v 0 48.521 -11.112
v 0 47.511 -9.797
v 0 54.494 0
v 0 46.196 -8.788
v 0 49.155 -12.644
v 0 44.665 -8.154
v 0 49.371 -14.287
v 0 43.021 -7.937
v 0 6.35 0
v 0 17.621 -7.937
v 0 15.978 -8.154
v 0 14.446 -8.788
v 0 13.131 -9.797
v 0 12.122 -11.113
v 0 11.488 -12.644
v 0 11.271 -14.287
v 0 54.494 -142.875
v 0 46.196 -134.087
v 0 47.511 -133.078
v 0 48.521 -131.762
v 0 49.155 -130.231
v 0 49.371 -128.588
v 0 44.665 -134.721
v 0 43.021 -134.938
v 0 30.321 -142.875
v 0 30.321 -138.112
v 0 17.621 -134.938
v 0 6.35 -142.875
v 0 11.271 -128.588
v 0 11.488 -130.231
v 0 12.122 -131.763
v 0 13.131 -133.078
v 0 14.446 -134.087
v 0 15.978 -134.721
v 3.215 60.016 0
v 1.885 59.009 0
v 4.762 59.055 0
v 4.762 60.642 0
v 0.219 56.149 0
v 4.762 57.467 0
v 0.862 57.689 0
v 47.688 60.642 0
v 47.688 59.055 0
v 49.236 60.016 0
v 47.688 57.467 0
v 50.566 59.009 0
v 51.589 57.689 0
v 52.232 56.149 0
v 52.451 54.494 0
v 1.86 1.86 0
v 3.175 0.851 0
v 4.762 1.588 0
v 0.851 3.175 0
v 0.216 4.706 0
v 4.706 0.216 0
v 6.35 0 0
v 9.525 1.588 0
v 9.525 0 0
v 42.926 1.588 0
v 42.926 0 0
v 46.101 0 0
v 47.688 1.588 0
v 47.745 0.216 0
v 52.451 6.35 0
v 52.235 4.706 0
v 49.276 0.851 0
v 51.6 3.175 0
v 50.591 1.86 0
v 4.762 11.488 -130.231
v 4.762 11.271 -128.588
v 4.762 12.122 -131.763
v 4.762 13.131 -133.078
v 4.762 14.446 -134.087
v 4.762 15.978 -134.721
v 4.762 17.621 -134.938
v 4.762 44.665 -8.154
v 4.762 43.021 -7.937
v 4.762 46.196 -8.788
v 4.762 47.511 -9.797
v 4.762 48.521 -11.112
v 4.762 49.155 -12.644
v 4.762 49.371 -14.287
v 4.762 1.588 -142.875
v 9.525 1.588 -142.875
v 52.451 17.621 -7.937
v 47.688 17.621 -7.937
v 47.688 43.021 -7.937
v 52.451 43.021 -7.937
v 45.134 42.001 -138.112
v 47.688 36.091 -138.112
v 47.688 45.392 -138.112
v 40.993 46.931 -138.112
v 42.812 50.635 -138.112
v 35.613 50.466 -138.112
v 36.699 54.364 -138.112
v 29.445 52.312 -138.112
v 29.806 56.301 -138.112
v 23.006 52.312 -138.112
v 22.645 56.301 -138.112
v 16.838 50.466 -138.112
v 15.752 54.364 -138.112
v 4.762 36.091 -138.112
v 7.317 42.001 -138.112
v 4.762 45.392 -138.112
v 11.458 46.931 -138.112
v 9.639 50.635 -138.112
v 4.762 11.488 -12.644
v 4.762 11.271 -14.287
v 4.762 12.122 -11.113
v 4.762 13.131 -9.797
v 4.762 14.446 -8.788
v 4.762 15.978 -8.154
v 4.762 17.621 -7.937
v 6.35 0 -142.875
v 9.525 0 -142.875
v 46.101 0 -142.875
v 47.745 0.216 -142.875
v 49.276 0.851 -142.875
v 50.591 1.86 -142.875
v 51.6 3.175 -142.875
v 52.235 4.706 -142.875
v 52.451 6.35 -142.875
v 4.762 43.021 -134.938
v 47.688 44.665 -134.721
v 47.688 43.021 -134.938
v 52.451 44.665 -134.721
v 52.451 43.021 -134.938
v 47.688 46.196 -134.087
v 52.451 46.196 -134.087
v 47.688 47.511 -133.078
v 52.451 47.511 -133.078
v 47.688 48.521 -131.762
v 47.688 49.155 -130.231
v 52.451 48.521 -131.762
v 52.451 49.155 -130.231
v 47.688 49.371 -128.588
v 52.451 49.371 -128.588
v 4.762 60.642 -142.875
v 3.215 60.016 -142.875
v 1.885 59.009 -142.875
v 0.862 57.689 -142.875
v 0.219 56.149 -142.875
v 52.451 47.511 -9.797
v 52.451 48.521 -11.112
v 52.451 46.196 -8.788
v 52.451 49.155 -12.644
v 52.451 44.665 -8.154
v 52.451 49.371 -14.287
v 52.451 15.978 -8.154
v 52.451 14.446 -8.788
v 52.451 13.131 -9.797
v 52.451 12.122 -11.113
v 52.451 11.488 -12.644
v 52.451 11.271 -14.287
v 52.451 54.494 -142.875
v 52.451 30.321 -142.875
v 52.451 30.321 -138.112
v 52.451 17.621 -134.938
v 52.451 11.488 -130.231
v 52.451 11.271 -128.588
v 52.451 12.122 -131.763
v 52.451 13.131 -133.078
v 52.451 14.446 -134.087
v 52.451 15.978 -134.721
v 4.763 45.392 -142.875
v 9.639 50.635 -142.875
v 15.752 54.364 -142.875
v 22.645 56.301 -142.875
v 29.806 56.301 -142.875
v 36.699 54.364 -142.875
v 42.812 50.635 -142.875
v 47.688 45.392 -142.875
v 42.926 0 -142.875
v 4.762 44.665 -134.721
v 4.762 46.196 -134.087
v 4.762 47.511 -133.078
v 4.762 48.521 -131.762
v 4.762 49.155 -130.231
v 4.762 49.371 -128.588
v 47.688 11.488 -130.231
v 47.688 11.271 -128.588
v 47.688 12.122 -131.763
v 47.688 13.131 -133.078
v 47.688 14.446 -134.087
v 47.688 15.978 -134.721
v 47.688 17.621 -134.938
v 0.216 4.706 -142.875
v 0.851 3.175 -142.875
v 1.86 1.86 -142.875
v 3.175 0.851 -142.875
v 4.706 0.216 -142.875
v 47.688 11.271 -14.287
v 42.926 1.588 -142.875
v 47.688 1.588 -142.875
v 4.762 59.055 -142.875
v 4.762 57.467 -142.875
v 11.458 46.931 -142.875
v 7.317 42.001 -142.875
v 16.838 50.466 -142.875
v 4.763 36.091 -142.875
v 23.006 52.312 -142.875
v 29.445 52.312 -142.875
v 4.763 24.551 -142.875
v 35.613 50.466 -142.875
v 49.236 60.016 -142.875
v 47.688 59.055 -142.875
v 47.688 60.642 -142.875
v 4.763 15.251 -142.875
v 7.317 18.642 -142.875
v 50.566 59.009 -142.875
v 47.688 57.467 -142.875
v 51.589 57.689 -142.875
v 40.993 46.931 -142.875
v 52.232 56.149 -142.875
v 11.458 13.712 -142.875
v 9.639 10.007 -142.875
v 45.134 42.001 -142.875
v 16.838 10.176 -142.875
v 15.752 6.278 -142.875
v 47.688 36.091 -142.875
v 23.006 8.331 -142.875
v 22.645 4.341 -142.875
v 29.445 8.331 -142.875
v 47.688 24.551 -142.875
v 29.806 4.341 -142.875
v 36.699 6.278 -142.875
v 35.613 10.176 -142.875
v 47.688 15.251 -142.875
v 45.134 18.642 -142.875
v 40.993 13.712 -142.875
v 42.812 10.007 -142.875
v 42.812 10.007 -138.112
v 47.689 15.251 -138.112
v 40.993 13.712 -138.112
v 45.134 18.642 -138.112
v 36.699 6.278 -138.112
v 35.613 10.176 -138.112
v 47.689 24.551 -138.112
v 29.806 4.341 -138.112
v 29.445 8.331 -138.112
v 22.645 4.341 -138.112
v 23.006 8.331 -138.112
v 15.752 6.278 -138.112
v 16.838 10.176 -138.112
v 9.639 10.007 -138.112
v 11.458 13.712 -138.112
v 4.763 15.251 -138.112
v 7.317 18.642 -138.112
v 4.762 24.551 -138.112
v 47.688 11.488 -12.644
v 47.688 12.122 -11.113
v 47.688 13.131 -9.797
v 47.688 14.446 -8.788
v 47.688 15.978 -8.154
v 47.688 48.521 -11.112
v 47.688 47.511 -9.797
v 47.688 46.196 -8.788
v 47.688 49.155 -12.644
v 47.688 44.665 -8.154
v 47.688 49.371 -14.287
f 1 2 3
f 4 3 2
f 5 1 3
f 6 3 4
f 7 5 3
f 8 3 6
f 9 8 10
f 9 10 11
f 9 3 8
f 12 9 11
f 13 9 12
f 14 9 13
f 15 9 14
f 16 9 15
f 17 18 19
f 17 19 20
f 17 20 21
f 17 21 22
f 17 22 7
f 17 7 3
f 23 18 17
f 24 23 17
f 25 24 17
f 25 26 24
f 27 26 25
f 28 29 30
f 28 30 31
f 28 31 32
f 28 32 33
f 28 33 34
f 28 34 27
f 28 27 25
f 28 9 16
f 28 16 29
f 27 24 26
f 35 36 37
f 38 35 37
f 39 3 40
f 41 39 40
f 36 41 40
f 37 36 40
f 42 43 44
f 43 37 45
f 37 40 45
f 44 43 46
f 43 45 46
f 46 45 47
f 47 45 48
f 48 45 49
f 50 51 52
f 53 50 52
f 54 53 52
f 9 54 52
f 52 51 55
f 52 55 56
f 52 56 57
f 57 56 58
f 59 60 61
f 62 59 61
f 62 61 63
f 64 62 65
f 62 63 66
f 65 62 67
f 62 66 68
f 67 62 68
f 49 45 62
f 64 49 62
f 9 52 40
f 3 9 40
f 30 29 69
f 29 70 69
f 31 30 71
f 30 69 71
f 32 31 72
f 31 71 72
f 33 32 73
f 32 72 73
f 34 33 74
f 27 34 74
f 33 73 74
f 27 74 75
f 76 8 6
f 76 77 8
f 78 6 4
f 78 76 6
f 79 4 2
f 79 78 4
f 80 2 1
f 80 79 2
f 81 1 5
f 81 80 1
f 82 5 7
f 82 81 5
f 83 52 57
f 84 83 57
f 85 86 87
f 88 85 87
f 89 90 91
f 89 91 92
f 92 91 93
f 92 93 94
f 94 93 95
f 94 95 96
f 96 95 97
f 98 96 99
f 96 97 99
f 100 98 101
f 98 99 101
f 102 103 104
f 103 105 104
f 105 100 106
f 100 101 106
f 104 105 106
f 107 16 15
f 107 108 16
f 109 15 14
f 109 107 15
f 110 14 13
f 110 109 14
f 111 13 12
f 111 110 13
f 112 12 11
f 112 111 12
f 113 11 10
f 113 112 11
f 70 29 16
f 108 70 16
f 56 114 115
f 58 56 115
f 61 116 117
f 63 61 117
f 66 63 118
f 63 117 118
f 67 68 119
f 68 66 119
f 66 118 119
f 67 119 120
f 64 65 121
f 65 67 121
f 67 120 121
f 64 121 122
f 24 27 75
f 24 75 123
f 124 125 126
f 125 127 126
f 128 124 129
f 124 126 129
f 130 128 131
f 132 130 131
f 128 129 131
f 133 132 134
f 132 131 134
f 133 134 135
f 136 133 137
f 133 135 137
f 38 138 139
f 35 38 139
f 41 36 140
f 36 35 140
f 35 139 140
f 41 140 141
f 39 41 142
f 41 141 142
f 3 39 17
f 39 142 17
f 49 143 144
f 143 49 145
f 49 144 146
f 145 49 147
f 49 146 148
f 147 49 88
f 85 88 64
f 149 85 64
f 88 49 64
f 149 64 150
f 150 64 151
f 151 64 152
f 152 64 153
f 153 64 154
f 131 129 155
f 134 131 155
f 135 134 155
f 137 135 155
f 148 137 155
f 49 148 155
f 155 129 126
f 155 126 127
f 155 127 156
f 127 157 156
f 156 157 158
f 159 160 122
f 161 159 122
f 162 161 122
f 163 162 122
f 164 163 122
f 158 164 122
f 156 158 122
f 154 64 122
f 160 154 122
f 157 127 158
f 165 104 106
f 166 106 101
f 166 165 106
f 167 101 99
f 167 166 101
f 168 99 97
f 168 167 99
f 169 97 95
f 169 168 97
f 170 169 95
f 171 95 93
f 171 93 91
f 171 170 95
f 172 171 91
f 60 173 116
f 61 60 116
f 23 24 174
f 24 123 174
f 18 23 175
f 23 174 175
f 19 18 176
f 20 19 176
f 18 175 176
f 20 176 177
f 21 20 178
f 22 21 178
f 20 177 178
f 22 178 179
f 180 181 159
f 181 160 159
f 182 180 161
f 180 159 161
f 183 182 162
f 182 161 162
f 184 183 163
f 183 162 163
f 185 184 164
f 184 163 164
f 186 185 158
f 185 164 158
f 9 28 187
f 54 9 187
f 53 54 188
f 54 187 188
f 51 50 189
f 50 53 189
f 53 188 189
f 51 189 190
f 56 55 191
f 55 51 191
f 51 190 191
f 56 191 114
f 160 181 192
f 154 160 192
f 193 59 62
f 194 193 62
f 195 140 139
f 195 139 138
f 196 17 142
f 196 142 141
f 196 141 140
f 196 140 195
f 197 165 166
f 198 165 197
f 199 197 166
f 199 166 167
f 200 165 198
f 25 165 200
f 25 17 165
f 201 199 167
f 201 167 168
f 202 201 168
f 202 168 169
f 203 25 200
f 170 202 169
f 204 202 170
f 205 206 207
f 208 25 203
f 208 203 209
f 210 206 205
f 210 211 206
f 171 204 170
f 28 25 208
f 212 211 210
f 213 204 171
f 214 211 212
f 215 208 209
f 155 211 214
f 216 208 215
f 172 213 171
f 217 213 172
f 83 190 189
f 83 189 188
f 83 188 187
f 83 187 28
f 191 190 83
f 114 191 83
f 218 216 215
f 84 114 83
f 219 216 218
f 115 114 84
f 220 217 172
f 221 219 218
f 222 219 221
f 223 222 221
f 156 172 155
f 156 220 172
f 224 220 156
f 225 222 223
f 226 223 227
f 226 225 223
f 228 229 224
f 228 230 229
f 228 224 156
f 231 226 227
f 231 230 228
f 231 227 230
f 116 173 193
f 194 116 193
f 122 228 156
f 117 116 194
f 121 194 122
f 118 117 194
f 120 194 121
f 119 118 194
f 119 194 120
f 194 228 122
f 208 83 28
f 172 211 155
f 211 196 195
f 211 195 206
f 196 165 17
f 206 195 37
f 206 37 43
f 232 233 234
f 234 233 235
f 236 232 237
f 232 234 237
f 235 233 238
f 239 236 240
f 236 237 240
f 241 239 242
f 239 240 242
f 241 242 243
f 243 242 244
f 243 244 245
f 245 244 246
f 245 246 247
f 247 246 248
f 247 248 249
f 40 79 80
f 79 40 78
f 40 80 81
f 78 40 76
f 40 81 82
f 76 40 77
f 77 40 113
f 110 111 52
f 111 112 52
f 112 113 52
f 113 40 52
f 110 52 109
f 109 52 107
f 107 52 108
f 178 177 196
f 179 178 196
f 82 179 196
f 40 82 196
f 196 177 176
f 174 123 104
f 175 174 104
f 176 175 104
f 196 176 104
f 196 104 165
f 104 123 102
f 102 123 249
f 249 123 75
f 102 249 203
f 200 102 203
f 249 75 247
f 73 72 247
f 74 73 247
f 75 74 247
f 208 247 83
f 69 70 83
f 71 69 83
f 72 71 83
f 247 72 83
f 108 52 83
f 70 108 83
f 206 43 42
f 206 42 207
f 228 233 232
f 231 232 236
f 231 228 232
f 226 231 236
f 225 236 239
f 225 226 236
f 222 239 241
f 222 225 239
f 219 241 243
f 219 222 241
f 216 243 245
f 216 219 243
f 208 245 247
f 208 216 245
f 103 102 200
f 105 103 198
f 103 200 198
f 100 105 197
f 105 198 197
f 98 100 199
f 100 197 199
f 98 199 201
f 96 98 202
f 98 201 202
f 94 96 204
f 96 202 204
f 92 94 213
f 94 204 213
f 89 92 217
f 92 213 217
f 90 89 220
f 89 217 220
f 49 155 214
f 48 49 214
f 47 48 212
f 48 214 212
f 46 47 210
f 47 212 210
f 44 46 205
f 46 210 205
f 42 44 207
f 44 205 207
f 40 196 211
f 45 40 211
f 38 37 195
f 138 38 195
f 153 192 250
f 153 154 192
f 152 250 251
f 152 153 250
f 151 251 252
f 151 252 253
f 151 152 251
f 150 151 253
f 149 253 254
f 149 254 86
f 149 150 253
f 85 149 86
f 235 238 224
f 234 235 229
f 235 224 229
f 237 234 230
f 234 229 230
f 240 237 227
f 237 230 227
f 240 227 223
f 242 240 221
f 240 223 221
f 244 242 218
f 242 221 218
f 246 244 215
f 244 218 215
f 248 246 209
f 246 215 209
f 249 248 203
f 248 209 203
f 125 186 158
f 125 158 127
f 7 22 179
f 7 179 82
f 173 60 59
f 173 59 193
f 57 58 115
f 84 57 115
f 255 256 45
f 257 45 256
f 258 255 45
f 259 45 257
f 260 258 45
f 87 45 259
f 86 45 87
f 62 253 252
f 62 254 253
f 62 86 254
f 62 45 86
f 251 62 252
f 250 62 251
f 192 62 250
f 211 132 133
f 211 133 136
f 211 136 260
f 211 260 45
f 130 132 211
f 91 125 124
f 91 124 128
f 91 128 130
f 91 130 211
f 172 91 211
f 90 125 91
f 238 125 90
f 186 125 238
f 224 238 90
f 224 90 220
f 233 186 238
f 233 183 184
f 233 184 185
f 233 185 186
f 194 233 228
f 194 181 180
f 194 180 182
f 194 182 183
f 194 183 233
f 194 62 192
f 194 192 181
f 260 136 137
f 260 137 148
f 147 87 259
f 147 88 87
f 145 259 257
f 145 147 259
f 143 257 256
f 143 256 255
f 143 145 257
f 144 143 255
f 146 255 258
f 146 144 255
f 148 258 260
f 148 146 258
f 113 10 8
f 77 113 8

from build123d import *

# Parameters (mm, degrees)
SKETCH1_W             = 9.525
SKETCH1_H             = 142.875
BOSS_EXTRUDE1_DEPTH   = 1.5875
BOSS_EXTRUDE1_2_DEPTH = 1.5875
SKETCH2_W             = 4.7625
SKETCH2_H             = 142.875
BOSS_EXTRUDE2_DEPTH   = 59.055
SKETCH3_W             = 127
SKETCH3_H             = 38.1
CUT_EXTRUDE1_DEPTH    = 164.834934713
SKETCH4_R             = 26.2255
SKETCH4_R_2           = 22.225
BOSS_EXTRUDE3_DEPTH   = 4.7625
FILLET1_R             = 6.35
FILLET4_R             = 6.35
SKETCH5_W             = 44.45
SKETCH5_H             = 1.5875
BOSS_EXTRUDE4_DEPTH   = 142.875


with BuildPart() as part:
    # Sketch1 → Boss-Extrude1 (new body)
    with BuildSketch(Plane(origin=(0, 0, 0), x_dir=(1, 0, 0), z_dir=(0, 1, 0))):
        with Locations((4.7625, 71.4375)):
            Rectangle(SKETCH1_W, SKETCH1_H)
    extrude(amount=BOSS_EXTRUDE1_DEPTH)



with BuildPart() as body_2:
    # Sketch1 → Boss-Extrude1 2 (new body)
    with BuildSketch(Plane(origin=(0, 0, 0), x_dir=(1, 0, 0), z_dir=(0, 1, 0))):
        with Locations((47.6885, 71.4375)):
            Rectangle(SKETCH1_W, SKETCH1_H)
    extrude(amount=BOSS_EXTRUDE1_2_DEPTH)


with BuildPart() as part_1:
    add(part.part)

    add(body_2.part)  # Boss-Extrude2 merges body 2
    # Sketch2 → Boss-Extrude2 (add)
    with BuildSketch(Plane(origin=(0, 1.5875, 0), x_dir=(1, 0, 0), z_dir=(0, 1, 0))):
        with Locations((2.38125, 71.4375)):
            Rectangle(SKETCH2_W, SKETCH2_H)
        with Locations((50.06975, 71.4375)):
            Rectangle(SKETCH2_W, SKETCH2_H)
    extrude(amount=BOSS_EXTRUDE2_DEPTH)

    # Sketch3 → Cut-Extrude1 (cut, through all)
    with BuildSketch(Plane.ZY):
        with Locations((-71.4375, 30.32125)):
            Rectangle(SKETCH3_W, SKETCH3_H)
    extrude(amount=-CUT_EXTRUDE1_DEPTH, mode=Mode.SUBTRACT)

    # Sketch4 → Boss-Extrude3 (add)
    with BuildSketch(Plane(origin=(0, 0, -142.875), x_dir=(-1, 0, 0), z_dir=(0, 0, -1))):
        with Locations((-26.2255, 30.32125)):
            Circle(SKETCH4_R)
        with Locations((-26.2255, 30.32125)):
            Circle(SKETCH4_R_2, mode=Mode.SUBTRACT)
    extrude(amount=-BOSS_EXTRUDE3_DEPTH)

    # Fillet1
    # the kernel refuses this fillet: 6.35 mm, written as the material it takes off along each edge
    with BuildSketch(Plane(origin=(52.451, 0, -158.75), x_dir=(0, 1, 0), z_dir=(0, 0, 1)), Plane(origin=(0, 0, -158.75), x_dir=(1, 0, 0), z_dir=(0, 0, 1))) as fillet1_piece_1:
        with BuildLine():
            CenterArc((FILLET1_R, FILLET1_R), FILLET1_R, 180, 90)
            Line((0, FILLET1_R), (-FILLET1_R * 0.02, FILLET1_R))
            Line((-FILLET1_R * 0.02, FILLET1_R), (-FILLET1_R * 0.02, -FILLET1_R * 0.02))
            Line((-FILLET1_R * 0.02, -FILLET1_R * 0.02), (FILLET1_R, -FILLET1_R * 0.02))
            Line((FILLET1_R, -FILLET1_R * 0.02), (FILLET1_R, 0))
        make_face()
    extrude(amount=174.625, mode=Mode.SUBTRACT)
    with BuildSketch(Plane(origin=(0, 60.6425, -158.245902655), x_dir=(1, 0, 0), z_dir=(0, 0, 1))) as fillet1_piece_2:
        with BuildLine():
            CenterArc((6.35, -6.148361062), FILLET1_R, 104.477512186, 75.522487814)
            Line((0, -6.148361062), (-0.127, -6.148361062))
            Line((-0.127, -6.148361062), (-0.127, 0))
            Line((-0.127, 0), (0, 0.127))
            ThreePointArc((0, 0.127), (2.38125, 0.127), (4.73075, 0.122967221))
            Line((4.73075, 0.122967221), (4.7625, 0))
        make_face()
    extrude(amount=173.616805311, mode=Mode.SUBTRACT)
    with BuildSketch(Plane(origin=(52.451, 60.6425, -158.245902655), x_dir=(0, -1, 0), z_dir=(0, 0, 1))) as fillet1_piece_3:
        with BuildLine():
            CenterArc((6.148361062, -6.35), FILLET1_R, 90, 75.522487814)
            Line((0, -4.7625), (-0.122967221, -4.73075))
            ThreePointArc((-0.122967221, -4.73075), (-0.127, -2.38125), (-0.127, 0))
            Line((-0.127, 0), (0, 0.127))
            Line((0, 0.127), (6.148361062, 0.127))
            Line((6.148361062, 0.127), (6.148361062, 0))
        make_face()
    extrude(amount=173.616805311, mode=Mode.SUBTRACT)

    # Fillet4
    fillet4_edges = [part_1.edges().sort_by_distance(p)[0] for p in [
        (2.38125, 11.27125, -134.9375),
        (2.38125, 49.37125, -134.9375),
        (2.38125, 49.37125, -7.9375),
        (2.38125, 11.27125, -7.9375),
        (50.06975, 49.37125, -134.9375),
        (50.06975, 49.37125, -7.9375),
        (50.06975, 11.27125, -7.9375),
        (50.06975, 11.27125, -134.9375),
    ]]
    fillet(fillet4_edges, radius=FILLET4_R)

    # Sketch5 → Boss-Extrude4 (add)
    with BuildSketch(Plane.XY):
        with Locations((26.2255, 58.26125)):
            Rectangle(SKETCH5_W, SKETCH5_H)
    extrude(amount=-BOSS_EXTRUDE4_DEPTH)


solid = part_1.part
